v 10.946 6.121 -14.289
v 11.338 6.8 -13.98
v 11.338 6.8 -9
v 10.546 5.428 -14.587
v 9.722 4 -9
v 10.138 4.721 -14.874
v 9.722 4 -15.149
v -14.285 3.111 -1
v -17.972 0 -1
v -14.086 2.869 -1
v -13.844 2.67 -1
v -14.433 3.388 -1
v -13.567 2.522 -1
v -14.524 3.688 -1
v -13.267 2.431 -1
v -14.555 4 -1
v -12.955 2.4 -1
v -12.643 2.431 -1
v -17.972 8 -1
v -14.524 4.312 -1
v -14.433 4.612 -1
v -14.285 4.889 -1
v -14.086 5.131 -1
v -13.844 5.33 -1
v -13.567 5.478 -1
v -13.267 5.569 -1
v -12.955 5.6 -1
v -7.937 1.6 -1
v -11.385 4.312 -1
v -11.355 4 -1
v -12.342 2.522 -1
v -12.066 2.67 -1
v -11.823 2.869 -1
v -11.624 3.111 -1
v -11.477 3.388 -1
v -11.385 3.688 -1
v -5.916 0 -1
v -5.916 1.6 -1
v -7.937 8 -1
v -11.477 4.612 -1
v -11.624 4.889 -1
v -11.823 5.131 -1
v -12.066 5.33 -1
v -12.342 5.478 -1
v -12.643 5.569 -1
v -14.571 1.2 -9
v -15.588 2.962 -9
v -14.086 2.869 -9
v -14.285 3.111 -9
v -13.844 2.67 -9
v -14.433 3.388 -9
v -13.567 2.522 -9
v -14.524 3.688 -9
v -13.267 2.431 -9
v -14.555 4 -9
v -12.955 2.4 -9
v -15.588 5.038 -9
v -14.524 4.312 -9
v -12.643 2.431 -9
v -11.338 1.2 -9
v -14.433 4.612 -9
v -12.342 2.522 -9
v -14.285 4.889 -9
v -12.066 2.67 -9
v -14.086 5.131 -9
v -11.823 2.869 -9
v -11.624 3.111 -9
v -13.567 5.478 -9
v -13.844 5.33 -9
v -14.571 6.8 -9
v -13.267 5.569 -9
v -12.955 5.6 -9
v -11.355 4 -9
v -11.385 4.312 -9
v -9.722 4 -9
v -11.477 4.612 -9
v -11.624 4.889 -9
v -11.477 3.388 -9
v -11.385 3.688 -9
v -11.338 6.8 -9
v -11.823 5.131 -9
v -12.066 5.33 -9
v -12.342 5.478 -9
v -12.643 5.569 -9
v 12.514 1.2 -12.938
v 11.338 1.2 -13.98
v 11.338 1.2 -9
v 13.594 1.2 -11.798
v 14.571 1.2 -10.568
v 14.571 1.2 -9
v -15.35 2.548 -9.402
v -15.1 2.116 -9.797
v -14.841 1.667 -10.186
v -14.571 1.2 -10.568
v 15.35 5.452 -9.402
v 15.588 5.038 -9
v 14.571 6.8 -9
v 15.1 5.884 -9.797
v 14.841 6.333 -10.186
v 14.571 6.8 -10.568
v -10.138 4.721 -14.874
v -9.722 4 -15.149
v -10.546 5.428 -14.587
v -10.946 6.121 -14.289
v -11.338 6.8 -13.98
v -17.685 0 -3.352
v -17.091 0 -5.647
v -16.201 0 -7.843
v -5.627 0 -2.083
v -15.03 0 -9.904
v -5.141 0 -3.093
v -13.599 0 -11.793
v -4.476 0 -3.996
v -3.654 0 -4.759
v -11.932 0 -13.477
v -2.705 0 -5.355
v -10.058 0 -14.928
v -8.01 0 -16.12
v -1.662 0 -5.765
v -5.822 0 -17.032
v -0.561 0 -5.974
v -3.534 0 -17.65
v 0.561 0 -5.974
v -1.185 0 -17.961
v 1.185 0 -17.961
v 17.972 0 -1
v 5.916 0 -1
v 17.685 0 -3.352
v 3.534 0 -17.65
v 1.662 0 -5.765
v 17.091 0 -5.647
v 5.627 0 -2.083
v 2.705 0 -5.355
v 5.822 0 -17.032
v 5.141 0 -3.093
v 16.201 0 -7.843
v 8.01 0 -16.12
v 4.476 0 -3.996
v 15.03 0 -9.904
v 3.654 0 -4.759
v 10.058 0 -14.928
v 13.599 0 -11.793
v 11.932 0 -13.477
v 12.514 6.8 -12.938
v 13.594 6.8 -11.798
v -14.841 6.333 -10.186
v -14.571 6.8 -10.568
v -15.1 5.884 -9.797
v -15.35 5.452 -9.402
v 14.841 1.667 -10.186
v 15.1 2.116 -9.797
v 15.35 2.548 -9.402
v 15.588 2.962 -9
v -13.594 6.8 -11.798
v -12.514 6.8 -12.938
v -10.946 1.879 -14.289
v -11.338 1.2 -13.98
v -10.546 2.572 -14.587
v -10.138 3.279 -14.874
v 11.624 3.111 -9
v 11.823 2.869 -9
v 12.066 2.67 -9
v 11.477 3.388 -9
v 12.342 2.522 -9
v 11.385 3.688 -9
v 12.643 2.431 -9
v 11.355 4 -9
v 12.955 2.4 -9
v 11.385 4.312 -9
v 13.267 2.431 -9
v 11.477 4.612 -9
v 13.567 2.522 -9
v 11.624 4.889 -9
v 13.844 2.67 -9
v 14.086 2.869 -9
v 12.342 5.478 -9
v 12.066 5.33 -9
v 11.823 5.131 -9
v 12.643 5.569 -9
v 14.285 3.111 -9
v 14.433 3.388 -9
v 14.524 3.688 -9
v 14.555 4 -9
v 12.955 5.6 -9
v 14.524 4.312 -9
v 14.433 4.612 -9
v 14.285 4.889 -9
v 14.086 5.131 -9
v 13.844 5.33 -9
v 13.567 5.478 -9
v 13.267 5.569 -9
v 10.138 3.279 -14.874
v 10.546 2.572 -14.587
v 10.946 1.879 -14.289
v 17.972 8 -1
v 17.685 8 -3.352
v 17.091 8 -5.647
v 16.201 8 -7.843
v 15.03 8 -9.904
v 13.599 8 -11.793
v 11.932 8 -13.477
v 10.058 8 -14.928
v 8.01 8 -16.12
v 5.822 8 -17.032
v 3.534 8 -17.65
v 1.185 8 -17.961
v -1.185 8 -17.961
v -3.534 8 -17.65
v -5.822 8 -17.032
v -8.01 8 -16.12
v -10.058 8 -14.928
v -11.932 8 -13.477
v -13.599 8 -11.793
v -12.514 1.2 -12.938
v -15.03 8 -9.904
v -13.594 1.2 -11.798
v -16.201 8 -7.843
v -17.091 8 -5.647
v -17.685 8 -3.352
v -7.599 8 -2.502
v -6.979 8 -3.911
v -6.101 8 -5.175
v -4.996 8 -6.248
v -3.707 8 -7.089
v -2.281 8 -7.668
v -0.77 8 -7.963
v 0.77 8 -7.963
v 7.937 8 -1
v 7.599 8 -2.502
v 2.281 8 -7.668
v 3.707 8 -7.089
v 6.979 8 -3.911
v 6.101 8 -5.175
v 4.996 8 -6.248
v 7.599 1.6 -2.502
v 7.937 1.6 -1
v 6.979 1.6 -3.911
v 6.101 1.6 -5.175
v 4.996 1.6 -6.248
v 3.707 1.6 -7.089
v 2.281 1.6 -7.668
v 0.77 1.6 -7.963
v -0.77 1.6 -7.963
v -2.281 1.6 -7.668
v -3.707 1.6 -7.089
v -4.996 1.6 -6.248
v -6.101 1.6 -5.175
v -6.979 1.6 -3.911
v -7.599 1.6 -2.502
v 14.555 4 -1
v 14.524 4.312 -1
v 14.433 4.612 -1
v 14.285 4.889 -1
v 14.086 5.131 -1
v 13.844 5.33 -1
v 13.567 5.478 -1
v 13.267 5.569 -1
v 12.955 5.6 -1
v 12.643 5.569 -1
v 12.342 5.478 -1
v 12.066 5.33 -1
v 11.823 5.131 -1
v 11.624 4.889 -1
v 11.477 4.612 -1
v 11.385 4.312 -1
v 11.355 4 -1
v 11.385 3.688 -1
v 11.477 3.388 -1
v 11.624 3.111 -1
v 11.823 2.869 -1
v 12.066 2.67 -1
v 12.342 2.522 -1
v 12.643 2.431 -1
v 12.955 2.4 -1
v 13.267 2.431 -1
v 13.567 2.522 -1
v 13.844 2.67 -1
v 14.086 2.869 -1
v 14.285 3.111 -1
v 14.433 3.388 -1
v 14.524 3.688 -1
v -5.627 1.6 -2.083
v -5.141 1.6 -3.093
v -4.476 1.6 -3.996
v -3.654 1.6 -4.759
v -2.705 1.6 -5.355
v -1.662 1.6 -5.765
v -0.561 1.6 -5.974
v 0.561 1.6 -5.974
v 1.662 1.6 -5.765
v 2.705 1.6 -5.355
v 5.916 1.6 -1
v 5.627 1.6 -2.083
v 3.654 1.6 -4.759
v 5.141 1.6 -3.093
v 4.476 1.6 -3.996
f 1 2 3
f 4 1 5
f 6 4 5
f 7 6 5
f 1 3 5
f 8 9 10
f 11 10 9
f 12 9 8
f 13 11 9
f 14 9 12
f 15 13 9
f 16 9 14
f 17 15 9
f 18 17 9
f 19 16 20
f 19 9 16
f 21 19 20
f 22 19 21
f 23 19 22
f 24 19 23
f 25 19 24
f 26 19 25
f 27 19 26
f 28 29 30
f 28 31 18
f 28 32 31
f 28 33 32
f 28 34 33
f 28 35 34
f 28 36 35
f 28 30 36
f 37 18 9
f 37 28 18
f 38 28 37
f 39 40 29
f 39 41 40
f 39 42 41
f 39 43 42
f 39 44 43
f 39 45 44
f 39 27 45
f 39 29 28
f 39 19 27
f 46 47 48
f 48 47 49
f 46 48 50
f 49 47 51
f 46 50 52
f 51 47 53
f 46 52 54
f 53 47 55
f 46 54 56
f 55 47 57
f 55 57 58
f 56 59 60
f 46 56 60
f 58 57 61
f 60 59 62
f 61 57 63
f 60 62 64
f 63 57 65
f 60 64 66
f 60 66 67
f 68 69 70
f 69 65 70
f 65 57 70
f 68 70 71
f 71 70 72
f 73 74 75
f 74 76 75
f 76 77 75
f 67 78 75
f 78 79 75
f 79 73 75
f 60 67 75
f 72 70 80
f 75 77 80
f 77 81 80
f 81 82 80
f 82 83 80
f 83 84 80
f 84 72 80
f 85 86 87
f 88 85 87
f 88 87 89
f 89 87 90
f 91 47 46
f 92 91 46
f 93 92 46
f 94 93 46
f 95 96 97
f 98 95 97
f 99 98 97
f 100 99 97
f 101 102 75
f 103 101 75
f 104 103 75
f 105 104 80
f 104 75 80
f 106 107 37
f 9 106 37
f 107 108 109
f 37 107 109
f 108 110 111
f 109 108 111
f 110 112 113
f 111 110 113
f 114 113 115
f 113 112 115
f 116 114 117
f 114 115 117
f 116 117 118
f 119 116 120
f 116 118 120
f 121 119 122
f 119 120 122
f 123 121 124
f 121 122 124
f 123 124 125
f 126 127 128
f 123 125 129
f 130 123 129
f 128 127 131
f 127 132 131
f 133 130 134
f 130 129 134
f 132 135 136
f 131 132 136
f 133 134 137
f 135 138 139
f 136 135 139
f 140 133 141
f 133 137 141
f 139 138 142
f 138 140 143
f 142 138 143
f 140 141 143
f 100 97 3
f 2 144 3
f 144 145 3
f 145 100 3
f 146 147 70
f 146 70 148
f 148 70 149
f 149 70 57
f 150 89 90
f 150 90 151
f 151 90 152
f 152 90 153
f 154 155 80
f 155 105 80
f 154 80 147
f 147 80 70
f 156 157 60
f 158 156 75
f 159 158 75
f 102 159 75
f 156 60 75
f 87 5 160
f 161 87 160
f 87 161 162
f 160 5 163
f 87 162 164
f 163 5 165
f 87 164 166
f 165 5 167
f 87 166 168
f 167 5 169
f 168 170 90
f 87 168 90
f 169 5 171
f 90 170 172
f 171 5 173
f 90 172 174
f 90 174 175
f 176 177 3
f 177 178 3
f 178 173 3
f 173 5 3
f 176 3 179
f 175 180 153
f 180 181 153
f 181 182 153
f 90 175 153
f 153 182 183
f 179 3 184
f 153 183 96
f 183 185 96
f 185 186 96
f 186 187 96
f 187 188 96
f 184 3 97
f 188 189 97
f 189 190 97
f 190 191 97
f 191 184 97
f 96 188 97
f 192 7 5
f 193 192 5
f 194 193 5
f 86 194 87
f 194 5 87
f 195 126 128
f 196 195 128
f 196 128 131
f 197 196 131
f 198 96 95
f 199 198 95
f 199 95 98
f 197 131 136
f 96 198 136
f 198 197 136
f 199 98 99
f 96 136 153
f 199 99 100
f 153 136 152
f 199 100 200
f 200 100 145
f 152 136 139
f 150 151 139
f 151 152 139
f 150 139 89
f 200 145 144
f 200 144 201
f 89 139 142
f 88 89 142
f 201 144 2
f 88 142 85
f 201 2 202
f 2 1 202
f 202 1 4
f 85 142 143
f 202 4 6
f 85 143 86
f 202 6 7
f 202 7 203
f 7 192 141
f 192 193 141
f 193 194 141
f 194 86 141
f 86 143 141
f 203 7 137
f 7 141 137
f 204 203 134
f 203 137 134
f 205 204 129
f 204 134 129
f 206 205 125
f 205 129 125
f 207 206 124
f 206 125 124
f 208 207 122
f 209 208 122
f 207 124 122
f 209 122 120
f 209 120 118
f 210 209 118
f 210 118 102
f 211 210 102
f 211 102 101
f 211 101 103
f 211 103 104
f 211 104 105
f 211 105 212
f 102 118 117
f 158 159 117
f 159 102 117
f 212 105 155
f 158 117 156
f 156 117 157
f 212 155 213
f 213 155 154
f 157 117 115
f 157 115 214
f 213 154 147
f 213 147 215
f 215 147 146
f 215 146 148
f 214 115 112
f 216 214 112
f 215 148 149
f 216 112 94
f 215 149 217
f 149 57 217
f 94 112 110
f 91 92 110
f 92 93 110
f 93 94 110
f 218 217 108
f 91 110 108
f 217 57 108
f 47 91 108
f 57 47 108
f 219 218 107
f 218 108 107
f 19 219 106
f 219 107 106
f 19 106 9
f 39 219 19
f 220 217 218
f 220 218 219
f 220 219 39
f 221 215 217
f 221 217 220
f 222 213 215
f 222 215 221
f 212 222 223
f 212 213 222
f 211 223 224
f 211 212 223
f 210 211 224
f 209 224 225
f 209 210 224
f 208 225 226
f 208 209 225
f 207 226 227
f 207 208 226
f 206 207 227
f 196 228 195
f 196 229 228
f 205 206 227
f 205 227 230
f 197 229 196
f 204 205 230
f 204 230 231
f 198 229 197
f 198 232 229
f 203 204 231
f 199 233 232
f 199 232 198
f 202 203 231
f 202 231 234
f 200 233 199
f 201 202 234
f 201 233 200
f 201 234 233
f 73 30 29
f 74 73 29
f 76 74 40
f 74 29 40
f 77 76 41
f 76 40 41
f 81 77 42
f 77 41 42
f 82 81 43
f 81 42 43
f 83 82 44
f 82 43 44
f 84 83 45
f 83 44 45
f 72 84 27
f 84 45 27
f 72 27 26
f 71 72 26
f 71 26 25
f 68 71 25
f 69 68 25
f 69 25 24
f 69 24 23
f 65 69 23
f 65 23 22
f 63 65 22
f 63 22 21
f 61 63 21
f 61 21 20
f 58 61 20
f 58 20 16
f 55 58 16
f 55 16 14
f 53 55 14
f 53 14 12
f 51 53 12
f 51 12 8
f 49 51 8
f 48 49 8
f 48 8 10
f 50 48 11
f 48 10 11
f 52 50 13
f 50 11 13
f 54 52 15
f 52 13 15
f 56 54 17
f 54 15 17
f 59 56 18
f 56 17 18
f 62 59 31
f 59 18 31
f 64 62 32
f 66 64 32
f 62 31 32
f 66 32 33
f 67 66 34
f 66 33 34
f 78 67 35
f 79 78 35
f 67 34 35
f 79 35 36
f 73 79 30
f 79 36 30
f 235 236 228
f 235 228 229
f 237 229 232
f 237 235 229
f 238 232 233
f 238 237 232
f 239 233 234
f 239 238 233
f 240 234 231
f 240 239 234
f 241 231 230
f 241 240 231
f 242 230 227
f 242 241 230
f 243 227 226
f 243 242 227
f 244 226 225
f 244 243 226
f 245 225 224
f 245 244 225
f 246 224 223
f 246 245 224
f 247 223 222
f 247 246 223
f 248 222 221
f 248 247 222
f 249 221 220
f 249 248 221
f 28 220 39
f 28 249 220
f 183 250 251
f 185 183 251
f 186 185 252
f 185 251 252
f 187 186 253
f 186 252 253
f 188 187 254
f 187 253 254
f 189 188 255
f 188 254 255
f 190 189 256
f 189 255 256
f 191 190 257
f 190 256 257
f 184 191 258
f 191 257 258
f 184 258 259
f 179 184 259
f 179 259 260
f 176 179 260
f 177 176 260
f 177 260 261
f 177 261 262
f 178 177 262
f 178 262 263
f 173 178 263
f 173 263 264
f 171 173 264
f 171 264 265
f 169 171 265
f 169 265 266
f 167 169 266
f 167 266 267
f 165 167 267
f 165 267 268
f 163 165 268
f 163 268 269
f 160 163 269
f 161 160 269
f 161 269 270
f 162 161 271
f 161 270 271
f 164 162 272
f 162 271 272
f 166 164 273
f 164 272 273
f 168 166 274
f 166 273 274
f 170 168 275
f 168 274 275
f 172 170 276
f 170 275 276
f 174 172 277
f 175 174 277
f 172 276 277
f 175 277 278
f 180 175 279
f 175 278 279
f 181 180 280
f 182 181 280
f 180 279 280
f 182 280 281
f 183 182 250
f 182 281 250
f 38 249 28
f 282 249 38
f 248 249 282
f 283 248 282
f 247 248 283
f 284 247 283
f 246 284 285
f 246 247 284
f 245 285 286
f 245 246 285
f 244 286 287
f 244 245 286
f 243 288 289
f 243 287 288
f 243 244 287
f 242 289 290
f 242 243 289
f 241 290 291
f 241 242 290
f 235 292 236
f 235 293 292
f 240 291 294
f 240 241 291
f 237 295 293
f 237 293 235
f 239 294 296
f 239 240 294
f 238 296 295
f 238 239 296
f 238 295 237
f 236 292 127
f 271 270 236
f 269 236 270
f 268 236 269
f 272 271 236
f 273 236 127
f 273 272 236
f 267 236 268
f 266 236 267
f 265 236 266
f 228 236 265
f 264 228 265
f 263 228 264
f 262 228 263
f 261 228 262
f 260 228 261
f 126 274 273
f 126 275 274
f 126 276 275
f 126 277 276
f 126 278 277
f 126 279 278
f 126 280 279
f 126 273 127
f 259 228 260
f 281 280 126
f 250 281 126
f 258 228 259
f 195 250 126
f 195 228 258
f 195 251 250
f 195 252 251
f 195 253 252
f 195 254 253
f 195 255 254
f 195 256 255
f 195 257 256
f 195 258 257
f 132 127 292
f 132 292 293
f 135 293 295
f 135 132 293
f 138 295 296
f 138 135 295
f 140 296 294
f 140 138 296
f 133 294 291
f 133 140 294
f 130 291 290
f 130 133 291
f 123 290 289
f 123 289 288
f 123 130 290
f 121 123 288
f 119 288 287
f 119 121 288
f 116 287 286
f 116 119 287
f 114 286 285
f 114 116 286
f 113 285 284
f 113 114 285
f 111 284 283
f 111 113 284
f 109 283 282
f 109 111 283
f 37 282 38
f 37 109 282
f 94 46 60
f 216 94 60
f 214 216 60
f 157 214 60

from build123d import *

# Parameters (mm, degrees)
SKETCH1_R           = 18
SKETCH1_R_2         = 8
BOSS_EXTRUDE1_DEPTH = 8
SKETCH2_R           = 8
SKETCH2_R_2         = 6
BOSS_EXTRUDE2_DEPTH = 1.6
SKETCH3_W           = 40
SKETCH3_H           = 20
CUT_EXTRUDE1_DEPTH  = 9
CUT_EXTRUDE2_REACH  = 19
SKETCH5_R           = 1.6
CUT_EXTRUDE3_REACH  = 27
CUT_EXTRUDE3_START  = -8


with BuildPart() as part:
    # Sketch1 → Boss-Extrude1 (new body)
    with BuildSketch(Plane(origin=(0, 0, 0), x_dir=(1, 0, 0), z_dir=(0, 1, 0))):
        Circle(SKETCH1_R)
        Circle(SKETCH1_R_2, mode=Mode.SUBTRACT)
    extrude(amount=BOSS_EXTRUDE1_DEPTH)

    # Sketch2 → Boss-Extrude2 (add)
    with BuildSketch(Plane(origin=(0, 0, 0), x_dir=(1, 0, 0), z_dir=(0, 1, 0))):
        Circle(SKETCH2_R)
        Circle(SKETCH2_R_2, mode=Mode.SUBTRACT)
    extrude(amount=BOSS_EXTRUDE2_DEPTH)

    # Sketch3 → Cut-Extrude1 (cut, through all)
    with BuildSketch(Plane(origin=(0, 8, 0), x_dir=(1, 0, 0), z_dir=(0, 1, 0))):
        with Locations((0, -9)):
            Rectangle(SKETCH3_W, SKETCH3_H)
    extrude(amount=-CUT_EXTRUDE1_DEPTH, mode=Mode.SUBTRACT)

    # Sketch5 → Cut-Extrude2 (cut, up to next)
    with BuildSketch(Plane.XY.offset(-1), mode=Mode.PRIVATE) as cut_extrude2_sk1:
        with Locations((-12.954727344, 4)):
            Circle(SKETCH5_R)
    cut_extrude2_tool1 = extrude(cut_extrude2_sk1.sketch, amount=-CUT_EXTRUDE2_REACH, mode=Mode.PRIVATE) & part.part
    add(cut_extrude2_tool1.solids().sort_by_distance((-12.954727, 4, -1))[0], mode=Mode.SUBTRACT)
    # Sketch5 → Cut-Extrude2 (cut, up to next)
    with BuildSketch(Plane.XY.offset(-1), mode=Mode.PRIVATE) as cut_extrude2_sk2:
        with Locations((12.954727344, 4)):
            Circle(SKETCH5_R)
    cut_extrude2_tool2 = extrude(cut_extrude2_sk2.sketch, amount=-CUT_EXTRUDE2_REACH, mode=Mode.PRIVATE) & part.part
    add(cut_extrude2_tool2.solids().sort_by_distance((12.954727, 4, -1))[0], mode=Mode.SUBTRACT)

    # Sketch6 → Cut-Extrude3 (cut, up to next)
    with BuildSketch(Plane.XY.offset(-1).offset(CUT_EXTRUDE3_START), mode=Mode.PRIVATE) as cut_extrude3_sk1:
        Polygon((-9.721565837, 4), (-11.338146591, 6.8), (-14.571308098, 6.8), (-16.187888852, 4), (-14.571308098, 1.2), (-11.338146591, 1.2), align=None)
    cut_extrude3_tool1 = extrude(cut_extrude3_sk1.sketch, amount=-CUT_EXTRUDE3_REACH, mode=Mode.PRIVATE) & part.part
    add(cut_extrude3_tool1.solids().sort_by_distance((-12.954727, 4, -9))[0], mode=Mode.SUBTRACT)
    # Sketch6 → Cut-Extrude3 (cut, up to next)
    with BuildSketch(Plane.XY.offset(-1).offset(CUT_EXTRUDE3_START), mode=Mode.PRIVATE) as cut_extrude3_sk2:
        Polygon((16.187888852, 4), (14.571308098, 6.8), (11.338146591, 6.8), (9.721565837, 4), (11.338146591, 1.2), (14.571308098, 1.2), align=None)
    cut_extrude3_tool2 = extrude(cut_extrude3_sk2.sketch, amount=-CUT_EXTRUDE3_REACH, mode=Mode.PRIVATE) & part.part
    add(cut_extrude3_tool2.solids().sort_by_distance((12.954727, 4, -9))[0], mode=Mode.SUBTRACT)


solid = part.part
